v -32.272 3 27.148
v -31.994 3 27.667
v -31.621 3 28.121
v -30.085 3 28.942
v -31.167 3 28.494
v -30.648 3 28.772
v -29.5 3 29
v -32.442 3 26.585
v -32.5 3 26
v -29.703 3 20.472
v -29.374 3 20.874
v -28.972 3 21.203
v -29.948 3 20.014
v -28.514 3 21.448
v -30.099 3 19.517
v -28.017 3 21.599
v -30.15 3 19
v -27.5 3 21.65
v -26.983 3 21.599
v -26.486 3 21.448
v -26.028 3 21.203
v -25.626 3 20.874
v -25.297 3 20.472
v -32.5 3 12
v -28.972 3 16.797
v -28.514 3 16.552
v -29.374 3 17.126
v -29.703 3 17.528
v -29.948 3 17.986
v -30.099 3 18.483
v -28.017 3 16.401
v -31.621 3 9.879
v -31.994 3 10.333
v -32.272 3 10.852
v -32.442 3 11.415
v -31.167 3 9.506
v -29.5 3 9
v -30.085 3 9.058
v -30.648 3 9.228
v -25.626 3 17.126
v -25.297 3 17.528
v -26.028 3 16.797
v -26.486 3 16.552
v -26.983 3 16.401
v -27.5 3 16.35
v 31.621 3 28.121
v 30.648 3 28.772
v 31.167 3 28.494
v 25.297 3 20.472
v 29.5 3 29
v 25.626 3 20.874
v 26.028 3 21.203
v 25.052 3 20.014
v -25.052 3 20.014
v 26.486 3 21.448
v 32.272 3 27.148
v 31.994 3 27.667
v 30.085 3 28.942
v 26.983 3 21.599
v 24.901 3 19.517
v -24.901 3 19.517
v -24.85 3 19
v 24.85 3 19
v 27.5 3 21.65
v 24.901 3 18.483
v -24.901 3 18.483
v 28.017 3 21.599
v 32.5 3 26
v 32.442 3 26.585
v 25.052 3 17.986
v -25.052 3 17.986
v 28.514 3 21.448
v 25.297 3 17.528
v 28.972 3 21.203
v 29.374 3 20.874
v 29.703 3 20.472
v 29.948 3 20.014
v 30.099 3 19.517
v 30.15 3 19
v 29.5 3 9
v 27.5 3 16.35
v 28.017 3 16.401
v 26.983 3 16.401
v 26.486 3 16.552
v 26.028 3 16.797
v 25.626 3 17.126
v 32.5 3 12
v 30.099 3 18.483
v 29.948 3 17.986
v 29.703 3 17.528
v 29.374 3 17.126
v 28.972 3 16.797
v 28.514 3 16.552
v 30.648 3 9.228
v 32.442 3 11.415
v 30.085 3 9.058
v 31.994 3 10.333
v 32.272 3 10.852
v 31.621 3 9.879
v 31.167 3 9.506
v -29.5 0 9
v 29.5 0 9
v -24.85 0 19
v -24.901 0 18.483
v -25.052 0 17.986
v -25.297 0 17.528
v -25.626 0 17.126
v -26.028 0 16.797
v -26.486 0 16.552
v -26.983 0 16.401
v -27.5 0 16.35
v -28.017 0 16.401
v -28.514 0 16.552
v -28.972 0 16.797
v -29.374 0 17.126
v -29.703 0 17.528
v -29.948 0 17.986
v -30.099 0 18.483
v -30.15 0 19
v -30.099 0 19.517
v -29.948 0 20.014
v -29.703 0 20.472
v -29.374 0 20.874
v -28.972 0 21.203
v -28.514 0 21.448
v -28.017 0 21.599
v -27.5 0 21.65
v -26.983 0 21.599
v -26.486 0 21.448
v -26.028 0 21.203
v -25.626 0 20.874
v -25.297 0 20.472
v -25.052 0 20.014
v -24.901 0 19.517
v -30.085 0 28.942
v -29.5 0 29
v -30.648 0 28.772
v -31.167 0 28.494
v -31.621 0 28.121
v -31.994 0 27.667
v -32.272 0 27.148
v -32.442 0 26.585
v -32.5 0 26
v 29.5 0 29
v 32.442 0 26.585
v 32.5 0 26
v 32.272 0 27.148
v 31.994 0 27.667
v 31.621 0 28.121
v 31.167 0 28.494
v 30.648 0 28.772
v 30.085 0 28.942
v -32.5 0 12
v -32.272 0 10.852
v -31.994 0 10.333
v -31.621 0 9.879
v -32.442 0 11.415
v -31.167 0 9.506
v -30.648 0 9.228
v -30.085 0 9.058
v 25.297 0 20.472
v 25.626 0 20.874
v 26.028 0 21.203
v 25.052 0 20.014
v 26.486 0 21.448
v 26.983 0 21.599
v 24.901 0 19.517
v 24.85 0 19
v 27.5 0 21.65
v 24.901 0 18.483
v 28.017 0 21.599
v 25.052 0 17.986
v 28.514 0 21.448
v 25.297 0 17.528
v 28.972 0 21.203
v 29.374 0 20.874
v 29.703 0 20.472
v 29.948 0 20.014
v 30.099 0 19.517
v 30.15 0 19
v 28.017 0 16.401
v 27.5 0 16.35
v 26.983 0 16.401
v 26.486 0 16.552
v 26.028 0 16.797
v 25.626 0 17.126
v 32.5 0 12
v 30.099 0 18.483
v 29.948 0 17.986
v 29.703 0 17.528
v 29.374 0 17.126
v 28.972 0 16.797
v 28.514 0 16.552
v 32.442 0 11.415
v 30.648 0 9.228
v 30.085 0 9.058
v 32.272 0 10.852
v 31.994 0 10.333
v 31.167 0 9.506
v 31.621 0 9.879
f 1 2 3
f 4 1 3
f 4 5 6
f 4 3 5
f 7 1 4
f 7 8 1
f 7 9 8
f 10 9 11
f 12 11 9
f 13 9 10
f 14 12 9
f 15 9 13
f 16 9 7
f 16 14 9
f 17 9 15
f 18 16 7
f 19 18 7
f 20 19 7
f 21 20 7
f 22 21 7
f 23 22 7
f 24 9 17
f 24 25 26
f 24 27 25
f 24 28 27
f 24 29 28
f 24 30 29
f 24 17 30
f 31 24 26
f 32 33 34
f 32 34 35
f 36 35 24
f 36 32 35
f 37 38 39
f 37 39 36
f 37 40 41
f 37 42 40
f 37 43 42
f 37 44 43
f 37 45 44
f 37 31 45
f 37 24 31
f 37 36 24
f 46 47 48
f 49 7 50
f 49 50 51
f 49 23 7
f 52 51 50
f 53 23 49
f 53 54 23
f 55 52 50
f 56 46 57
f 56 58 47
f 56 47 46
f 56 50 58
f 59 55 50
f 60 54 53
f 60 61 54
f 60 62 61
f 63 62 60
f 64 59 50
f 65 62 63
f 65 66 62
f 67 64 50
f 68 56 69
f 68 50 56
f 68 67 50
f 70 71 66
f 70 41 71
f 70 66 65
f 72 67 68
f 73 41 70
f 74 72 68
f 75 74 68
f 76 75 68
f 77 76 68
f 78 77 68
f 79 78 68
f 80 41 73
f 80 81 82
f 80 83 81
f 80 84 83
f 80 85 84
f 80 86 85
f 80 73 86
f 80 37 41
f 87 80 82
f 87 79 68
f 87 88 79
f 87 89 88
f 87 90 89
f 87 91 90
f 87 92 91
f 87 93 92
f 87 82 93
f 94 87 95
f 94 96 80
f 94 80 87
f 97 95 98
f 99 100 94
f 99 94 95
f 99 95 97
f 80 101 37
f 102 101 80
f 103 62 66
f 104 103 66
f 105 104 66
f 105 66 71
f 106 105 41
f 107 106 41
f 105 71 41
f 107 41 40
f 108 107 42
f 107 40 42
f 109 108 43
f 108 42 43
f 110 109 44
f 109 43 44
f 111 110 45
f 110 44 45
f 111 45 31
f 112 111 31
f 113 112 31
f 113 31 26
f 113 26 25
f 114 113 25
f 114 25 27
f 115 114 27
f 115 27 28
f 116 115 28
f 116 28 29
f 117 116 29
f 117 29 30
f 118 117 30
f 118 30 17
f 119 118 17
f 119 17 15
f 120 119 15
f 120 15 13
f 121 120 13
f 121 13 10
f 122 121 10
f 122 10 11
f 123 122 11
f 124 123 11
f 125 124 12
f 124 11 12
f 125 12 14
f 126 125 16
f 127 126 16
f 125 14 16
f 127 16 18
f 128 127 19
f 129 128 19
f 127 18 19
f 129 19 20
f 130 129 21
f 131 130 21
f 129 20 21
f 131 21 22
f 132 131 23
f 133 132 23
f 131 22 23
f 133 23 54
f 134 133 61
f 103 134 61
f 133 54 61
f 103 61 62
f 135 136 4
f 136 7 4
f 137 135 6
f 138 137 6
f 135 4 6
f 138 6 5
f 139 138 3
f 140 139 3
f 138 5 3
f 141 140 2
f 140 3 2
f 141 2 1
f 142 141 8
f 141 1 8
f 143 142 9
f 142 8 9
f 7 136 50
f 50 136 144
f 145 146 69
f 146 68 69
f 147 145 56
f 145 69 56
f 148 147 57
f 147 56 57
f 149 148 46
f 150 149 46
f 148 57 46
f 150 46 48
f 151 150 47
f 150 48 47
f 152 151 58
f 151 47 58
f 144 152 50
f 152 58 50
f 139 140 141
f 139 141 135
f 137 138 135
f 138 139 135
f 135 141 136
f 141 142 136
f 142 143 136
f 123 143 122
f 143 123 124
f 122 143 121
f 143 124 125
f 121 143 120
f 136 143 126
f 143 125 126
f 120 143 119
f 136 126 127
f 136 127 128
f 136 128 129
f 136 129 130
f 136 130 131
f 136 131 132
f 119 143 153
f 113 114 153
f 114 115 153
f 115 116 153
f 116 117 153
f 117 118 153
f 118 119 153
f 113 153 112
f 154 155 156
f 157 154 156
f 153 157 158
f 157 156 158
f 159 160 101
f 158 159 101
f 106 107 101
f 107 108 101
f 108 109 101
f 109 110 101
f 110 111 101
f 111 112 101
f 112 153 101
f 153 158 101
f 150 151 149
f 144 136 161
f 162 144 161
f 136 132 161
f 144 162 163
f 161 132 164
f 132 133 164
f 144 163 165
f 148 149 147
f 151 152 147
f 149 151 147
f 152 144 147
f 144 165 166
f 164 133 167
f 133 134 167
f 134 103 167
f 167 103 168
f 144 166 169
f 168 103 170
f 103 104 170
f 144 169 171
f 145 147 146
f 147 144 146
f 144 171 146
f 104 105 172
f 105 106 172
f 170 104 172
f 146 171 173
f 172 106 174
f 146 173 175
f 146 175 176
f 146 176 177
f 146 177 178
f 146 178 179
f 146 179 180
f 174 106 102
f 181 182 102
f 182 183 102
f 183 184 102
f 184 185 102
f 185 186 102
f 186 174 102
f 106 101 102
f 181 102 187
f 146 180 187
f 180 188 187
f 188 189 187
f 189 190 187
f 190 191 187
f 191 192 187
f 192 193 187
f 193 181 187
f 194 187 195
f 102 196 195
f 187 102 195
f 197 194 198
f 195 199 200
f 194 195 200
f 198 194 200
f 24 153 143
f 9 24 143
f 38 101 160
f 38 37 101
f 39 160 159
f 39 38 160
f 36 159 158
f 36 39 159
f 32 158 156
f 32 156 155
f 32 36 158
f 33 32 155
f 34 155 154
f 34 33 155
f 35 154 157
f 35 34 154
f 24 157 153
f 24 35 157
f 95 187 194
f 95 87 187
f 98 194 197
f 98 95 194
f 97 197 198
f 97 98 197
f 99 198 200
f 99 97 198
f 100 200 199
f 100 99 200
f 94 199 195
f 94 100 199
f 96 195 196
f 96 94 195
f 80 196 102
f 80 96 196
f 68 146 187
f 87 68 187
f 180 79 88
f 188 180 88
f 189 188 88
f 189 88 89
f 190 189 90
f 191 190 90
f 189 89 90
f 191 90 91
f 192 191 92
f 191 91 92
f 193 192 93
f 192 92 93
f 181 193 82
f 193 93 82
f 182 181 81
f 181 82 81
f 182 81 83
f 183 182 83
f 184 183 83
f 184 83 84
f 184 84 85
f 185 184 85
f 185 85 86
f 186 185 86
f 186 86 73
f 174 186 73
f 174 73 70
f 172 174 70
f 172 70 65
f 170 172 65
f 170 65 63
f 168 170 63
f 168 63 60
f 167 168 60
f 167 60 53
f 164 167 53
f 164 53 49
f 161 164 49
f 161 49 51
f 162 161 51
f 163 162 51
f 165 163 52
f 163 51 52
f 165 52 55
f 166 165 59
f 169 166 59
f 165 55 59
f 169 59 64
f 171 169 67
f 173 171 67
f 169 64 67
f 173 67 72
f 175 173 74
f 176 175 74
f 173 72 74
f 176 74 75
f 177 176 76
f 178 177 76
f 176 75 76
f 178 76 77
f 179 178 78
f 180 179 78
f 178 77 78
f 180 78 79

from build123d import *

# Parameters (mm, degrees)
BOSS_EXTRUDE1_DEPTH  = 3
M3_CLEARANCE_HOLE1_D = 3.2
M5_CLEARANCE_HOLE1_D = 5.3
SKETCH8_W            = 65
SKETCH8_H            = 21.5
CUT_EXTRUDE1_DEPTH   = 4
FILLET2_R            = 3


with BuildPart() as part:
    # Sketch1 → Boss-Extrude1 (new body)
    with BuildSketch(Plane(origin=(0, 0, 0), x_dir=(1, 0, 0), z_dir=(0, 1, 0))):
        with BuildLine():
            Line((32.5, -29), (32.5, -9))
            Line((32.5, -9), (7.563621408, 9.951966197))
            ThreePointArc((7.563621408, 9.951966197), (0, 12.5), (-7.563621408, 9.951966197))
            Line((-7.563621408, 9.951966197), (-32.5, -9))
            Line((-32.5, -9), (-32.5, -29))
            Line((-32.5, -29), (32.5, -29))
        make_face()
        with BuildLine():
            ThreePointArc((-4, 0), (0, 4), (4, 0))
            ThreePointArc((4, 0), (0, -4), (-4, 0))
        make_face(mode=Mode.SUBTRACT)
    extrude(amount=BOSS_EXTRUDE1_DEPTH)

    # M3 Clearance Hole1 (through all)
    with Locations(Plane(origin=(0, 0, 0), x_dir=(-1, 0, 0), z_dir=(0, -1, 0))):
        with Locations((8.5, 0), (-8.5, 0)):
            Hole(M3_CLEARANCE_HOLE1_D / 2)

    # M5 Clearance Hole1 (through all)
    with Locations(Plane(origin=(0, 0, 0), x_dir=(-1, 0, 0), z_dir=(0, -1, 0))):
        with Locations((-27.5, -19), (27.5, -19)):
            Hole(M5_CLEARANCE_HOLE1_D / 2)

    # Sketch8 → Cut-Extrude1 (cut, through all)
    with BuildSketch(Plane(origin=(0, 0, 0), x_dir=(1, 0, 0), z_dir=(0, 1, 0))):
        with Locations((0, 1.75)):
            Rectangle(SKETCH8_W, SKETCH8_H)
    extrude(amount=CUT_EXTRUDE1_DEPTH, mode=Mode.SUBTRACT)

    # Fillet2
    fillet2_edges = [part.edges().sort_by_distance(p)[0] for p in [
        (32.5, 1.5, 9),
        (32.5, 1.5, 29),
        (-32.5, 1.5, 29),
        (-32.5, 1.5, 9),
    ]]
    fillet(fillet2_edges, radius=FILLET2_R)


solid = part.part
